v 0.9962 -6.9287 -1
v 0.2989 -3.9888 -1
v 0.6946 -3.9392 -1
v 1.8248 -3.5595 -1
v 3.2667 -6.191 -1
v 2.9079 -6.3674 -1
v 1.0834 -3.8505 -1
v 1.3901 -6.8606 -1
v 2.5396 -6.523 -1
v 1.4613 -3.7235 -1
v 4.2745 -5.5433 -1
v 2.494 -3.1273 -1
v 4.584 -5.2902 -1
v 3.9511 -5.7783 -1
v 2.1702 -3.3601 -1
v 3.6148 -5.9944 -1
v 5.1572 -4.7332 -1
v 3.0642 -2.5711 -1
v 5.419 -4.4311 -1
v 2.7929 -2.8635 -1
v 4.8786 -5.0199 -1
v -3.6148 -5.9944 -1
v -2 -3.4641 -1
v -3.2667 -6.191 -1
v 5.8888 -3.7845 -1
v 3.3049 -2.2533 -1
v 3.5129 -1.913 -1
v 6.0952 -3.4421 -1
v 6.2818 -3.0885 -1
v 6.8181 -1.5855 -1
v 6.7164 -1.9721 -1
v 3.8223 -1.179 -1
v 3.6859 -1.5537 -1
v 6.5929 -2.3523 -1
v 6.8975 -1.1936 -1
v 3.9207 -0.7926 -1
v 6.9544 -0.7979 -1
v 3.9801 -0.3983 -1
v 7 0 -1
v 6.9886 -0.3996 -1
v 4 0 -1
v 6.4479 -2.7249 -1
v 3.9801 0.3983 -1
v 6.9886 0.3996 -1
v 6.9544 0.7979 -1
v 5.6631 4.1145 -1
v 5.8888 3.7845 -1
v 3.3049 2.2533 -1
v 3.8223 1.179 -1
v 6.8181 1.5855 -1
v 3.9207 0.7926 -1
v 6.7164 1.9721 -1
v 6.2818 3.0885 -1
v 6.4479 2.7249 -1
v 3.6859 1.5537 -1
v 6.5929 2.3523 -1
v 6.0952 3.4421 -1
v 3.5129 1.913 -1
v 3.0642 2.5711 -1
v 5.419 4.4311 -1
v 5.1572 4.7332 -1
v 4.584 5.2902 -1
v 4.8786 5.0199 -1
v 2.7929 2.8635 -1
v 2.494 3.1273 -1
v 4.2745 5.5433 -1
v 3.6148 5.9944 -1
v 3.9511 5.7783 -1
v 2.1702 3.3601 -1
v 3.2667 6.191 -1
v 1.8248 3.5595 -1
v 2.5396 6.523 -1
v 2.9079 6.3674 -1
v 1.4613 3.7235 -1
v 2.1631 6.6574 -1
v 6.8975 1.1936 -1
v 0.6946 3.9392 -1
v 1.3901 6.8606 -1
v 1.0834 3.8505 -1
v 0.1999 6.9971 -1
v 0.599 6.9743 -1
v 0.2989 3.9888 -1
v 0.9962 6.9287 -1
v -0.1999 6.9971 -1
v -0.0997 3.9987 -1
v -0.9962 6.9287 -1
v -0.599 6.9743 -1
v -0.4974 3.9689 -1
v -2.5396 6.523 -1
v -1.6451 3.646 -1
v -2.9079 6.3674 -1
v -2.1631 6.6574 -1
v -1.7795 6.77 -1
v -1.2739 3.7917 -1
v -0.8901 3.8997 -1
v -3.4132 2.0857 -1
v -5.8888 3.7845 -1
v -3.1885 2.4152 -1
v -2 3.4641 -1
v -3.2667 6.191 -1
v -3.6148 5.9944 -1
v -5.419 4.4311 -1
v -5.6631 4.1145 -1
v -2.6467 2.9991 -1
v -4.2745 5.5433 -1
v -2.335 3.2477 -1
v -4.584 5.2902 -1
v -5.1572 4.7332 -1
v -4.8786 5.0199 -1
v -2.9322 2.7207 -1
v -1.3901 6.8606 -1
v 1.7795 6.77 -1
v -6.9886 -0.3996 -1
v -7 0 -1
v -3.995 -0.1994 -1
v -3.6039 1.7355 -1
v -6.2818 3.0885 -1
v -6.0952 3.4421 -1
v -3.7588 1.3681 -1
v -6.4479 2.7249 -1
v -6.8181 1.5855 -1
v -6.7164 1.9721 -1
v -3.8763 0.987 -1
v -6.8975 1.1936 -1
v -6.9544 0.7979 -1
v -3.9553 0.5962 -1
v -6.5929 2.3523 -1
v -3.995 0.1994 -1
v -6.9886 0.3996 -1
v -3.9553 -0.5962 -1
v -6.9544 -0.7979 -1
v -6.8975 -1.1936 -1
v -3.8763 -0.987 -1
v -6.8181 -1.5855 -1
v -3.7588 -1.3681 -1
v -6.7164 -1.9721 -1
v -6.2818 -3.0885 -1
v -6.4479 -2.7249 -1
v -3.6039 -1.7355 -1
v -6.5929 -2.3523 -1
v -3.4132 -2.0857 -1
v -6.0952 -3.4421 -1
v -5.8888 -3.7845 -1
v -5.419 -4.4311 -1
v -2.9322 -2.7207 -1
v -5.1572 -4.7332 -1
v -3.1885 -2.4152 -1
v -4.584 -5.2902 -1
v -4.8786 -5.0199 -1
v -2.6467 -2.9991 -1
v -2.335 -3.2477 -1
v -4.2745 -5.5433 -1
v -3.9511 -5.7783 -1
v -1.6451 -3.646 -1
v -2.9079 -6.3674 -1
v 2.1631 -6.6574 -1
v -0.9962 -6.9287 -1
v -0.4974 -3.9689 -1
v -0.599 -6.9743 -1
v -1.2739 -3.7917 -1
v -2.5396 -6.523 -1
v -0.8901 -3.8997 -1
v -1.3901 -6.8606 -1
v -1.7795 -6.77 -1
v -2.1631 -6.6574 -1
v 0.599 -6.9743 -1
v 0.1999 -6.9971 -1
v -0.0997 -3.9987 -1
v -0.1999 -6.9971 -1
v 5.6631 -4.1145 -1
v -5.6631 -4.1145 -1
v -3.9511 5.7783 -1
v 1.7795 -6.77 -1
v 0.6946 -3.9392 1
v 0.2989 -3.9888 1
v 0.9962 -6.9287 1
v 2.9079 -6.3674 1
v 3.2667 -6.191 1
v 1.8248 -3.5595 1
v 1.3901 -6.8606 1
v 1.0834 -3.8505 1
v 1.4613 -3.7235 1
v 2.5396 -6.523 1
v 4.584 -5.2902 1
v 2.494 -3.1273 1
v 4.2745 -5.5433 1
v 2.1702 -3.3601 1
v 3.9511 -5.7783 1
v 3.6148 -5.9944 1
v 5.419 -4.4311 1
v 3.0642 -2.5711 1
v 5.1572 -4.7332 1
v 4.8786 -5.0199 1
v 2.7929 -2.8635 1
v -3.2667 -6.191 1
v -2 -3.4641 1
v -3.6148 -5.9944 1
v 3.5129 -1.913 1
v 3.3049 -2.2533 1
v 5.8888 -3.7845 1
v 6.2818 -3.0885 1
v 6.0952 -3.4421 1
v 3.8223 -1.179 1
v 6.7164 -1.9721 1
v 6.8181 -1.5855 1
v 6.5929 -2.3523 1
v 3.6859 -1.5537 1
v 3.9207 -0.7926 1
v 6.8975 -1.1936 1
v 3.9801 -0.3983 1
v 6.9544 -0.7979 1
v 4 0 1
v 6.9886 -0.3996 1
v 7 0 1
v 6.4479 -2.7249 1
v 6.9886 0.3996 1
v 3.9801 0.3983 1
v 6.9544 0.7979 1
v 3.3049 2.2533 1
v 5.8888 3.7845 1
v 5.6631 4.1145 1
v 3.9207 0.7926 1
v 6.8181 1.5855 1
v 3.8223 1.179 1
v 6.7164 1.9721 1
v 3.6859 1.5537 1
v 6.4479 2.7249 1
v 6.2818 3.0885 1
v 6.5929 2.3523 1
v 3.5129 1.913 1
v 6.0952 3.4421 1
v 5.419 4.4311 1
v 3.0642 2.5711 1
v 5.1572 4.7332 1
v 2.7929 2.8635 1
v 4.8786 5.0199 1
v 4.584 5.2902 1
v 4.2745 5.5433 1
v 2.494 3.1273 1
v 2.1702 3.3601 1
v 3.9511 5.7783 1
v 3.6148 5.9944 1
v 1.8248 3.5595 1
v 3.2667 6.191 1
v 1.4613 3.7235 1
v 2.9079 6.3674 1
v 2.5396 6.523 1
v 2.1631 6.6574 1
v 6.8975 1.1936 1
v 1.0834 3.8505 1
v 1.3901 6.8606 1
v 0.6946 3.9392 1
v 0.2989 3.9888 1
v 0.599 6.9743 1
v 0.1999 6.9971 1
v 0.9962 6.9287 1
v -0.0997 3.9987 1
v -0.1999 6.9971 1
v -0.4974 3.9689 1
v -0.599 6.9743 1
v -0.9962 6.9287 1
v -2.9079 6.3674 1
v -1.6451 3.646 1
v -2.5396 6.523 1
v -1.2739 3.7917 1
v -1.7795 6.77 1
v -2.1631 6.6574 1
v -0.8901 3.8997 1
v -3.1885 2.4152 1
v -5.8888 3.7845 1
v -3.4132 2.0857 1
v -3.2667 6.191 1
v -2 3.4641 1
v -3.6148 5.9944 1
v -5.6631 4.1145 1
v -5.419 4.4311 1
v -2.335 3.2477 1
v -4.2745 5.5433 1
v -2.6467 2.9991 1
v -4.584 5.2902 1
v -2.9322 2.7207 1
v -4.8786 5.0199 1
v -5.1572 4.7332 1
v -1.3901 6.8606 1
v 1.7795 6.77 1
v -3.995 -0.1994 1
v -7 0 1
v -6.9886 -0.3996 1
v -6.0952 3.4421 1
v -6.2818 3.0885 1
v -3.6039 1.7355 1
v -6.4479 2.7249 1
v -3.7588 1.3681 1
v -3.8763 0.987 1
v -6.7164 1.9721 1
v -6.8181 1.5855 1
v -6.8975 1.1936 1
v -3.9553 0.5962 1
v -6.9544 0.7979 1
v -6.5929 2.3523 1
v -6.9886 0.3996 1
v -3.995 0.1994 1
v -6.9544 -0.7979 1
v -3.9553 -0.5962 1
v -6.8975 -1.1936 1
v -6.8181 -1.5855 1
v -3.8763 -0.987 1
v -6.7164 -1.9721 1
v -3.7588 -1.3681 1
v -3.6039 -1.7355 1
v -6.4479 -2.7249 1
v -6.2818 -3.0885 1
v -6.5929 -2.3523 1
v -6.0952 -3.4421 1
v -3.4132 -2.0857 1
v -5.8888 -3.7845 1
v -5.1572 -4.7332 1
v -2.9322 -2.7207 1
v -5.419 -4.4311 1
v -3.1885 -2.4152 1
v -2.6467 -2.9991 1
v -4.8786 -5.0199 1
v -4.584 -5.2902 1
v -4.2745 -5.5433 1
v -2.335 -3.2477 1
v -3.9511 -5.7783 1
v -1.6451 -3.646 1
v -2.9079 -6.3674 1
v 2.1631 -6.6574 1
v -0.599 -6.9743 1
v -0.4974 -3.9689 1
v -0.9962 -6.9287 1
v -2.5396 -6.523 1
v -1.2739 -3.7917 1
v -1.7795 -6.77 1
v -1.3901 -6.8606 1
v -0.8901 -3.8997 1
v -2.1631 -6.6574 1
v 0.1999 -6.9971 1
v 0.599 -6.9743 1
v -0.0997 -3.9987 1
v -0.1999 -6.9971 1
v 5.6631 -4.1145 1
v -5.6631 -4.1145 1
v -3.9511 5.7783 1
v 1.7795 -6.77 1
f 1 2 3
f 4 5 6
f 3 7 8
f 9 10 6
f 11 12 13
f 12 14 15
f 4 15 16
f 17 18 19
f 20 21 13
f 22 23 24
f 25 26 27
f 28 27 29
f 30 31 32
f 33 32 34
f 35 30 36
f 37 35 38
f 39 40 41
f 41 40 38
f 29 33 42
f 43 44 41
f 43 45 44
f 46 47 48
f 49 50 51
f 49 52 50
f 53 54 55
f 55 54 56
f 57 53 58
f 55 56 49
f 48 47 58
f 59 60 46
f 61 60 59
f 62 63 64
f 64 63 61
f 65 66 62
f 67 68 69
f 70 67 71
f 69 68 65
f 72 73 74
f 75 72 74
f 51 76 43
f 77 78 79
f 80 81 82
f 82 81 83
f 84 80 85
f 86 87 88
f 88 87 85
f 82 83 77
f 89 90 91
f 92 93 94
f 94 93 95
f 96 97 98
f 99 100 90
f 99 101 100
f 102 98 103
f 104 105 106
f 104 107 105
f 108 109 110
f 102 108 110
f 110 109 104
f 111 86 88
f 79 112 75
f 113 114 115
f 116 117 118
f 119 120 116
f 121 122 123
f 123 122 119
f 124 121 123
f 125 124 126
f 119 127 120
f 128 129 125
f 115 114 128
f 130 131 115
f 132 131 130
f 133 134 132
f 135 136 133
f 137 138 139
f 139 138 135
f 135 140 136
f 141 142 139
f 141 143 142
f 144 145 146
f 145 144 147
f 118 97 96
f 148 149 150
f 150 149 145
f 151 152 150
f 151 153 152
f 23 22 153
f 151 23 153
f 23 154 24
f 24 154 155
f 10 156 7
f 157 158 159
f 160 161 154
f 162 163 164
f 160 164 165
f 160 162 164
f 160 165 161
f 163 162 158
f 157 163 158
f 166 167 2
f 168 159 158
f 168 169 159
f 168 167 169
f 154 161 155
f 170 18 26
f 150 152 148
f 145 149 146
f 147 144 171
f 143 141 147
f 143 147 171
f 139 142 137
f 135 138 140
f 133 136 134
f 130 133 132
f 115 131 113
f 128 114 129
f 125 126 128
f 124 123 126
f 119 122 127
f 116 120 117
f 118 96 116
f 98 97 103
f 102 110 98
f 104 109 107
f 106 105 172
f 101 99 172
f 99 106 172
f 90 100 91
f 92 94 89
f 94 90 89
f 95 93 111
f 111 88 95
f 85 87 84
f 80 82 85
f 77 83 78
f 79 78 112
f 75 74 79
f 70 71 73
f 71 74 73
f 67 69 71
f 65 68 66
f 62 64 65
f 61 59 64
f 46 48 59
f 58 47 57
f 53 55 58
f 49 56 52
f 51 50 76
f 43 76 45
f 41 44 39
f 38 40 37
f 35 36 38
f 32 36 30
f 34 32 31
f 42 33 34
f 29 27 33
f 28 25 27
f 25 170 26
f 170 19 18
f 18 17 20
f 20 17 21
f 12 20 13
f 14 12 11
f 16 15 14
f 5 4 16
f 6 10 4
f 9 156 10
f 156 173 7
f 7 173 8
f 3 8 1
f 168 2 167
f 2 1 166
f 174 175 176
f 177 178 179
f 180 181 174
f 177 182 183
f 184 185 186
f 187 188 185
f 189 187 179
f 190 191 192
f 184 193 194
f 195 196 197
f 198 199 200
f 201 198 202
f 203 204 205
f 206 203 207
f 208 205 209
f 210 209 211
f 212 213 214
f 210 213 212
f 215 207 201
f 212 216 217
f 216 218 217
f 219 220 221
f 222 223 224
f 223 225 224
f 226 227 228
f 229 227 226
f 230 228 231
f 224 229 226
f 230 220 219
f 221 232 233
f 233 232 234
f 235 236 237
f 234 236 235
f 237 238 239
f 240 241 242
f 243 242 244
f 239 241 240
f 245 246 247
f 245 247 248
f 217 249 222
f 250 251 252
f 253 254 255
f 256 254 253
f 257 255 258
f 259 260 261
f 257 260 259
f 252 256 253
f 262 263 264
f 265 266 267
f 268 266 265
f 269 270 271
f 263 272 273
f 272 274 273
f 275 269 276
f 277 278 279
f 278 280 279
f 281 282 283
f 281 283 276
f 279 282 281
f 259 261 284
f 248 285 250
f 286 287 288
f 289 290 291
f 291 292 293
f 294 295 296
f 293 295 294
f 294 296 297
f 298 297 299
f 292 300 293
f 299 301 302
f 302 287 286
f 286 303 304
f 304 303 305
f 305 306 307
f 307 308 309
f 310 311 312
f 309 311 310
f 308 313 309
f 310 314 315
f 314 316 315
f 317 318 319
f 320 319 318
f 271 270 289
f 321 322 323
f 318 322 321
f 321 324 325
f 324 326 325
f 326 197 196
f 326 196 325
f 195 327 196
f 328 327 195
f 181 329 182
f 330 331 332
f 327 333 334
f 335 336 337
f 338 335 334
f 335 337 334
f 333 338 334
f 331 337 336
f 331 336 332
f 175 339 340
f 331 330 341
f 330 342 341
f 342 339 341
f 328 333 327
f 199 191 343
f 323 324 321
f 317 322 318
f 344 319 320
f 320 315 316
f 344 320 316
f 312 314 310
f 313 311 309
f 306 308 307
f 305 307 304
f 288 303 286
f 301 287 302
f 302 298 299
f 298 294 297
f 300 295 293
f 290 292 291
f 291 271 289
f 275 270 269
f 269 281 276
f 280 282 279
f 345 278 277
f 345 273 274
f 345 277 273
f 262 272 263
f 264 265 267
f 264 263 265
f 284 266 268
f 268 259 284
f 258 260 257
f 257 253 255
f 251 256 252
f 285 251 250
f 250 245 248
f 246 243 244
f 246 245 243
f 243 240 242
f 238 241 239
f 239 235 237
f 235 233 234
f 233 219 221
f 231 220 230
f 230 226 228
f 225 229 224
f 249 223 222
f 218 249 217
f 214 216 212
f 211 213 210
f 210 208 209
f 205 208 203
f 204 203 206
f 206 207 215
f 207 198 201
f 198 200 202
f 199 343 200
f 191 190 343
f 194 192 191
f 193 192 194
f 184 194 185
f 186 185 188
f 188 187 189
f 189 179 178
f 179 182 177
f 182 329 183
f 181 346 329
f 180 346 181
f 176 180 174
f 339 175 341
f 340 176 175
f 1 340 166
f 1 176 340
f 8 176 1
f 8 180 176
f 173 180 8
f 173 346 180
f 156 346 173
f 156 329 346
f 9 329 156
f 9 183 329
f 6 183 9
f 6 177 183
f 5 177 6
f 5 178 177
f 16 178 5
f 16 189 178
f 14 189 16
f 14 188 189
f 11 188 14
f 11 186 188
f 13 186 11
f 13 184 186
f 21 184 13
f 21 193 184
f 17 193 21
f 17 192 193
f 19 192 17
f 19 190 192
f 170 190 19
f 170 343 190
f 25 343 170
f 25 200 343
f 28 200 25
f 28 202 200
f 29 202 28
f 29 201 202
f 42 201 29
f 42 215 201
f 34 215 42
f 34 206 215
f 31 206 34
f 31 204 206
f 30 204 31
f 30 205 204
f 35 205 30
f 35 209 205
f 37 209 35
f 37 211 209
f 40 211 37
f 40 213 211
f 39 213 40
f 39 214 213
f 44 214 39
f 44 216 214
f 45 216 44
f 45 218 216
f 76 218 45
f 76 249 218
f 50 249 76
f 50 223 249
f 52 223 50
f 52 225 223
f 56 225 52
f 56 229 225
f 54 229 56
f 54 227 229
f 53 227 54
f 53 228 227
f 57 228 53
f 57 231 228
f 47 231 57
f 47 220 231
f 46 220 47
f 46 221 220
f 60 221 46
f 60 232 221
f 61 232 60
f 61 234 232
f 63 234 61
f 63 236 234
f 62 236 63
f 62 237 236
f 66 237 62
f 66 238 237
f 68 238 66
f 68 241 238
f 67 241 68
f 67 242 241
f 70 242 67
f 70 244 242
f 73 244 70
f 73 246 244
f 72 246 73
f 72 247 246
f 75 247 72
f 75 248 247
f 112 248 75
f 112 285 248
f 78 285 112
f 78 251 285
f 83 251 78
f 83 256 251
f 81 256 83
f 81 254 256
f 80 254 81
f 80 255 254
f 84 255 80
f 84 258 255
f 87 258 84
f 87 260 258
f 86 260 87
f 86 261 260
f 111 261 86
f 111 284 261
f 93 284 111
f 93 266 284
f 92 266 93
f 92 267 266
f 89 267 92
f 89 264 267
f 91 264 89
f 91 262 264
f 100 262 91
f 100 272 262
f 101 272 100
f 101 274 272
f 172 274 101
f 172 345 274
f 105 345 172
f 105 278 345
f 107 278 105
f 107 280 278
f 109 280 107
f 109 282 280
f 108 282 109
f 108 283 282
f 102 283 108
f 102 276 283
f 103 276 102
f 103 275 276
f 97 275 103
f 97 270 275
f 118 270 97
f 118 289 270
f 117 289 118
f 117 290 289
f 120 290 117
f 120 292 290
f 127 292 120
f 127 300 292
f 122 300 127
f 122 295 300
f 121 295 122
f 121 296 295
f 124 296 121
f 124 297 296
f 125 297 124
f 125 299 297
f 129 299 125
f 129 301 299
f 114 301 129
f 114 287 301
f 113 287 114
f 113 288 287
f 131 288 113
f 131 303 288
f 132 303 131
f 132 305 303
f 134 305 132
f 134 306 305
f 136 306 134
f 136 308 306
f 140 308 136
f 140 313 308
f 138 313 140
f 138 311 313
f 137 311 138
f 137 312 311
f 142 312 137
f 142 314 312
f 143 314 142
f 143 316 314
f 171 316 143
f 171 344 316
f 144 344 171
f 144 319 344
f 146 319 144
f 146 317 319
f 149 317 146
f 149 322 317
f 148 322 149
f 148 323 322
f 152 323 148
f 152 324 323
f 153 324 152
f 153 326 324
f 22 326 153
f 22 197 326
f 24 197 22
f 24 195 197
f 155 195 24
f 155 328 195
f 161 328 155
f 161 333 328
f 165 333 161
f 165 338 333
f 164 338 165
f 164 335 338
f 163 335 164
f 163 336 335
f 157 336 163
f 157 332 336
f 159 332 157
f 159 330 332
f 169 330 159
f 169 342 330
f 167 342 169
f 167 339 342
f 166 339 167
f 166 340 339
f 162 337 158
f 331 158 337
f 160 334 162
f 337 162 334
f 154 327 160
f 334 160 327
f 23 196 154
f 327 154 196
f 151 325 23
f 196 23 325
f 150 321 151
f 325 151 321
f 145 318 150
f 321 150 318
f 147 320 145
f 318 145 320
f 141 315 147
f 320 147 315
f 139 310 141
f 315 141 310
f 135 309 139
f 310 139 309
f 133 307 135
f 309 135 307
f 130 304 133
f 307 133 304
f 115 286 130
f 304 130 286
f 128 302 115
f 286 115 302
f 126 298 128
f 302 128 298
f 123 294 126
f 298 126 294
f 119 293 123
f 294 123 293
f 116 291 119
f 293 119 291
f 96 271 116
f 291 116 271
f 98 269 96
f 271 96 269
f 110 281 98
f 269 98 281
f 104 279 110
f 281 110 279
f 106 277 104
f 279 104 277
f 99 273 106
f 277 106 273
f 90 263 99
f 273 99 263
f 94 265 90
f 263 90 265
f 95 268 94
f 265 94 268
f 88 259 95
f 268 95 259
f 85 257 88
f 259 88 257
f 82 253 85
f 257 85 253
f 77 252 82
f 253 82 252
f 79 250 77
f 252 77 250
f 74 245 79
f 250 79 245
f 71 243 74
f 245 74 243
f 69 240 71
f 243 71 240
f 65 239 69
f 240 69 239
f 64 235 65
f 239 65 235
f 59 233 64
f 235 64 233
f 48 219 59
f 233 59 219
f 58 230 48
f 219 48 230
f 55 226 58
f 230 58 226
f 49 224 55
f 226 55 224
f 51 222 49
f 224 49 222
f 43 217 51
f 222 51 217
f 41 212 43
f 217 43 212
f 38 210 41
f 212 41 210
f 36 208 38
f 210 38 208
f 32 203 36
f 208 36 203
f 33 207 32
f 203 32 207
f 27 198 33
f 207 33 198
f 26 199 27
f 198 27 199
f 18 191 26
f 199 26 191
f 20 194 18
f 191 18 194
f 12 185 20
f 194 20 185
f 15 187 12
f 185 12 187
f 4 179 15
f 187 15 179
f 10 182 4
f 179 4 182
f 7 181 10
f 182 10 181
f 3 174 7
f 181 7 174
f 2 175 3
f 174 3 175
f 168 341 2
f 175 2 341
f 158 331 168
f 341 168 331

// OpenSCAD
$fa = 1;
$fs = 0.4;

module washer(height, outer_radius, inner_radius, center = false) {
  linear_extrude(height = height, center=center) {
    difference() {
        circle(r=outer_radius);
        circle(r=inner_radius);
    }
  }
}

outer_radius = 7;
inner_radius = 7 - 3;
height = 2;

washer(height, outer_radius, inner_radius, center=true);
